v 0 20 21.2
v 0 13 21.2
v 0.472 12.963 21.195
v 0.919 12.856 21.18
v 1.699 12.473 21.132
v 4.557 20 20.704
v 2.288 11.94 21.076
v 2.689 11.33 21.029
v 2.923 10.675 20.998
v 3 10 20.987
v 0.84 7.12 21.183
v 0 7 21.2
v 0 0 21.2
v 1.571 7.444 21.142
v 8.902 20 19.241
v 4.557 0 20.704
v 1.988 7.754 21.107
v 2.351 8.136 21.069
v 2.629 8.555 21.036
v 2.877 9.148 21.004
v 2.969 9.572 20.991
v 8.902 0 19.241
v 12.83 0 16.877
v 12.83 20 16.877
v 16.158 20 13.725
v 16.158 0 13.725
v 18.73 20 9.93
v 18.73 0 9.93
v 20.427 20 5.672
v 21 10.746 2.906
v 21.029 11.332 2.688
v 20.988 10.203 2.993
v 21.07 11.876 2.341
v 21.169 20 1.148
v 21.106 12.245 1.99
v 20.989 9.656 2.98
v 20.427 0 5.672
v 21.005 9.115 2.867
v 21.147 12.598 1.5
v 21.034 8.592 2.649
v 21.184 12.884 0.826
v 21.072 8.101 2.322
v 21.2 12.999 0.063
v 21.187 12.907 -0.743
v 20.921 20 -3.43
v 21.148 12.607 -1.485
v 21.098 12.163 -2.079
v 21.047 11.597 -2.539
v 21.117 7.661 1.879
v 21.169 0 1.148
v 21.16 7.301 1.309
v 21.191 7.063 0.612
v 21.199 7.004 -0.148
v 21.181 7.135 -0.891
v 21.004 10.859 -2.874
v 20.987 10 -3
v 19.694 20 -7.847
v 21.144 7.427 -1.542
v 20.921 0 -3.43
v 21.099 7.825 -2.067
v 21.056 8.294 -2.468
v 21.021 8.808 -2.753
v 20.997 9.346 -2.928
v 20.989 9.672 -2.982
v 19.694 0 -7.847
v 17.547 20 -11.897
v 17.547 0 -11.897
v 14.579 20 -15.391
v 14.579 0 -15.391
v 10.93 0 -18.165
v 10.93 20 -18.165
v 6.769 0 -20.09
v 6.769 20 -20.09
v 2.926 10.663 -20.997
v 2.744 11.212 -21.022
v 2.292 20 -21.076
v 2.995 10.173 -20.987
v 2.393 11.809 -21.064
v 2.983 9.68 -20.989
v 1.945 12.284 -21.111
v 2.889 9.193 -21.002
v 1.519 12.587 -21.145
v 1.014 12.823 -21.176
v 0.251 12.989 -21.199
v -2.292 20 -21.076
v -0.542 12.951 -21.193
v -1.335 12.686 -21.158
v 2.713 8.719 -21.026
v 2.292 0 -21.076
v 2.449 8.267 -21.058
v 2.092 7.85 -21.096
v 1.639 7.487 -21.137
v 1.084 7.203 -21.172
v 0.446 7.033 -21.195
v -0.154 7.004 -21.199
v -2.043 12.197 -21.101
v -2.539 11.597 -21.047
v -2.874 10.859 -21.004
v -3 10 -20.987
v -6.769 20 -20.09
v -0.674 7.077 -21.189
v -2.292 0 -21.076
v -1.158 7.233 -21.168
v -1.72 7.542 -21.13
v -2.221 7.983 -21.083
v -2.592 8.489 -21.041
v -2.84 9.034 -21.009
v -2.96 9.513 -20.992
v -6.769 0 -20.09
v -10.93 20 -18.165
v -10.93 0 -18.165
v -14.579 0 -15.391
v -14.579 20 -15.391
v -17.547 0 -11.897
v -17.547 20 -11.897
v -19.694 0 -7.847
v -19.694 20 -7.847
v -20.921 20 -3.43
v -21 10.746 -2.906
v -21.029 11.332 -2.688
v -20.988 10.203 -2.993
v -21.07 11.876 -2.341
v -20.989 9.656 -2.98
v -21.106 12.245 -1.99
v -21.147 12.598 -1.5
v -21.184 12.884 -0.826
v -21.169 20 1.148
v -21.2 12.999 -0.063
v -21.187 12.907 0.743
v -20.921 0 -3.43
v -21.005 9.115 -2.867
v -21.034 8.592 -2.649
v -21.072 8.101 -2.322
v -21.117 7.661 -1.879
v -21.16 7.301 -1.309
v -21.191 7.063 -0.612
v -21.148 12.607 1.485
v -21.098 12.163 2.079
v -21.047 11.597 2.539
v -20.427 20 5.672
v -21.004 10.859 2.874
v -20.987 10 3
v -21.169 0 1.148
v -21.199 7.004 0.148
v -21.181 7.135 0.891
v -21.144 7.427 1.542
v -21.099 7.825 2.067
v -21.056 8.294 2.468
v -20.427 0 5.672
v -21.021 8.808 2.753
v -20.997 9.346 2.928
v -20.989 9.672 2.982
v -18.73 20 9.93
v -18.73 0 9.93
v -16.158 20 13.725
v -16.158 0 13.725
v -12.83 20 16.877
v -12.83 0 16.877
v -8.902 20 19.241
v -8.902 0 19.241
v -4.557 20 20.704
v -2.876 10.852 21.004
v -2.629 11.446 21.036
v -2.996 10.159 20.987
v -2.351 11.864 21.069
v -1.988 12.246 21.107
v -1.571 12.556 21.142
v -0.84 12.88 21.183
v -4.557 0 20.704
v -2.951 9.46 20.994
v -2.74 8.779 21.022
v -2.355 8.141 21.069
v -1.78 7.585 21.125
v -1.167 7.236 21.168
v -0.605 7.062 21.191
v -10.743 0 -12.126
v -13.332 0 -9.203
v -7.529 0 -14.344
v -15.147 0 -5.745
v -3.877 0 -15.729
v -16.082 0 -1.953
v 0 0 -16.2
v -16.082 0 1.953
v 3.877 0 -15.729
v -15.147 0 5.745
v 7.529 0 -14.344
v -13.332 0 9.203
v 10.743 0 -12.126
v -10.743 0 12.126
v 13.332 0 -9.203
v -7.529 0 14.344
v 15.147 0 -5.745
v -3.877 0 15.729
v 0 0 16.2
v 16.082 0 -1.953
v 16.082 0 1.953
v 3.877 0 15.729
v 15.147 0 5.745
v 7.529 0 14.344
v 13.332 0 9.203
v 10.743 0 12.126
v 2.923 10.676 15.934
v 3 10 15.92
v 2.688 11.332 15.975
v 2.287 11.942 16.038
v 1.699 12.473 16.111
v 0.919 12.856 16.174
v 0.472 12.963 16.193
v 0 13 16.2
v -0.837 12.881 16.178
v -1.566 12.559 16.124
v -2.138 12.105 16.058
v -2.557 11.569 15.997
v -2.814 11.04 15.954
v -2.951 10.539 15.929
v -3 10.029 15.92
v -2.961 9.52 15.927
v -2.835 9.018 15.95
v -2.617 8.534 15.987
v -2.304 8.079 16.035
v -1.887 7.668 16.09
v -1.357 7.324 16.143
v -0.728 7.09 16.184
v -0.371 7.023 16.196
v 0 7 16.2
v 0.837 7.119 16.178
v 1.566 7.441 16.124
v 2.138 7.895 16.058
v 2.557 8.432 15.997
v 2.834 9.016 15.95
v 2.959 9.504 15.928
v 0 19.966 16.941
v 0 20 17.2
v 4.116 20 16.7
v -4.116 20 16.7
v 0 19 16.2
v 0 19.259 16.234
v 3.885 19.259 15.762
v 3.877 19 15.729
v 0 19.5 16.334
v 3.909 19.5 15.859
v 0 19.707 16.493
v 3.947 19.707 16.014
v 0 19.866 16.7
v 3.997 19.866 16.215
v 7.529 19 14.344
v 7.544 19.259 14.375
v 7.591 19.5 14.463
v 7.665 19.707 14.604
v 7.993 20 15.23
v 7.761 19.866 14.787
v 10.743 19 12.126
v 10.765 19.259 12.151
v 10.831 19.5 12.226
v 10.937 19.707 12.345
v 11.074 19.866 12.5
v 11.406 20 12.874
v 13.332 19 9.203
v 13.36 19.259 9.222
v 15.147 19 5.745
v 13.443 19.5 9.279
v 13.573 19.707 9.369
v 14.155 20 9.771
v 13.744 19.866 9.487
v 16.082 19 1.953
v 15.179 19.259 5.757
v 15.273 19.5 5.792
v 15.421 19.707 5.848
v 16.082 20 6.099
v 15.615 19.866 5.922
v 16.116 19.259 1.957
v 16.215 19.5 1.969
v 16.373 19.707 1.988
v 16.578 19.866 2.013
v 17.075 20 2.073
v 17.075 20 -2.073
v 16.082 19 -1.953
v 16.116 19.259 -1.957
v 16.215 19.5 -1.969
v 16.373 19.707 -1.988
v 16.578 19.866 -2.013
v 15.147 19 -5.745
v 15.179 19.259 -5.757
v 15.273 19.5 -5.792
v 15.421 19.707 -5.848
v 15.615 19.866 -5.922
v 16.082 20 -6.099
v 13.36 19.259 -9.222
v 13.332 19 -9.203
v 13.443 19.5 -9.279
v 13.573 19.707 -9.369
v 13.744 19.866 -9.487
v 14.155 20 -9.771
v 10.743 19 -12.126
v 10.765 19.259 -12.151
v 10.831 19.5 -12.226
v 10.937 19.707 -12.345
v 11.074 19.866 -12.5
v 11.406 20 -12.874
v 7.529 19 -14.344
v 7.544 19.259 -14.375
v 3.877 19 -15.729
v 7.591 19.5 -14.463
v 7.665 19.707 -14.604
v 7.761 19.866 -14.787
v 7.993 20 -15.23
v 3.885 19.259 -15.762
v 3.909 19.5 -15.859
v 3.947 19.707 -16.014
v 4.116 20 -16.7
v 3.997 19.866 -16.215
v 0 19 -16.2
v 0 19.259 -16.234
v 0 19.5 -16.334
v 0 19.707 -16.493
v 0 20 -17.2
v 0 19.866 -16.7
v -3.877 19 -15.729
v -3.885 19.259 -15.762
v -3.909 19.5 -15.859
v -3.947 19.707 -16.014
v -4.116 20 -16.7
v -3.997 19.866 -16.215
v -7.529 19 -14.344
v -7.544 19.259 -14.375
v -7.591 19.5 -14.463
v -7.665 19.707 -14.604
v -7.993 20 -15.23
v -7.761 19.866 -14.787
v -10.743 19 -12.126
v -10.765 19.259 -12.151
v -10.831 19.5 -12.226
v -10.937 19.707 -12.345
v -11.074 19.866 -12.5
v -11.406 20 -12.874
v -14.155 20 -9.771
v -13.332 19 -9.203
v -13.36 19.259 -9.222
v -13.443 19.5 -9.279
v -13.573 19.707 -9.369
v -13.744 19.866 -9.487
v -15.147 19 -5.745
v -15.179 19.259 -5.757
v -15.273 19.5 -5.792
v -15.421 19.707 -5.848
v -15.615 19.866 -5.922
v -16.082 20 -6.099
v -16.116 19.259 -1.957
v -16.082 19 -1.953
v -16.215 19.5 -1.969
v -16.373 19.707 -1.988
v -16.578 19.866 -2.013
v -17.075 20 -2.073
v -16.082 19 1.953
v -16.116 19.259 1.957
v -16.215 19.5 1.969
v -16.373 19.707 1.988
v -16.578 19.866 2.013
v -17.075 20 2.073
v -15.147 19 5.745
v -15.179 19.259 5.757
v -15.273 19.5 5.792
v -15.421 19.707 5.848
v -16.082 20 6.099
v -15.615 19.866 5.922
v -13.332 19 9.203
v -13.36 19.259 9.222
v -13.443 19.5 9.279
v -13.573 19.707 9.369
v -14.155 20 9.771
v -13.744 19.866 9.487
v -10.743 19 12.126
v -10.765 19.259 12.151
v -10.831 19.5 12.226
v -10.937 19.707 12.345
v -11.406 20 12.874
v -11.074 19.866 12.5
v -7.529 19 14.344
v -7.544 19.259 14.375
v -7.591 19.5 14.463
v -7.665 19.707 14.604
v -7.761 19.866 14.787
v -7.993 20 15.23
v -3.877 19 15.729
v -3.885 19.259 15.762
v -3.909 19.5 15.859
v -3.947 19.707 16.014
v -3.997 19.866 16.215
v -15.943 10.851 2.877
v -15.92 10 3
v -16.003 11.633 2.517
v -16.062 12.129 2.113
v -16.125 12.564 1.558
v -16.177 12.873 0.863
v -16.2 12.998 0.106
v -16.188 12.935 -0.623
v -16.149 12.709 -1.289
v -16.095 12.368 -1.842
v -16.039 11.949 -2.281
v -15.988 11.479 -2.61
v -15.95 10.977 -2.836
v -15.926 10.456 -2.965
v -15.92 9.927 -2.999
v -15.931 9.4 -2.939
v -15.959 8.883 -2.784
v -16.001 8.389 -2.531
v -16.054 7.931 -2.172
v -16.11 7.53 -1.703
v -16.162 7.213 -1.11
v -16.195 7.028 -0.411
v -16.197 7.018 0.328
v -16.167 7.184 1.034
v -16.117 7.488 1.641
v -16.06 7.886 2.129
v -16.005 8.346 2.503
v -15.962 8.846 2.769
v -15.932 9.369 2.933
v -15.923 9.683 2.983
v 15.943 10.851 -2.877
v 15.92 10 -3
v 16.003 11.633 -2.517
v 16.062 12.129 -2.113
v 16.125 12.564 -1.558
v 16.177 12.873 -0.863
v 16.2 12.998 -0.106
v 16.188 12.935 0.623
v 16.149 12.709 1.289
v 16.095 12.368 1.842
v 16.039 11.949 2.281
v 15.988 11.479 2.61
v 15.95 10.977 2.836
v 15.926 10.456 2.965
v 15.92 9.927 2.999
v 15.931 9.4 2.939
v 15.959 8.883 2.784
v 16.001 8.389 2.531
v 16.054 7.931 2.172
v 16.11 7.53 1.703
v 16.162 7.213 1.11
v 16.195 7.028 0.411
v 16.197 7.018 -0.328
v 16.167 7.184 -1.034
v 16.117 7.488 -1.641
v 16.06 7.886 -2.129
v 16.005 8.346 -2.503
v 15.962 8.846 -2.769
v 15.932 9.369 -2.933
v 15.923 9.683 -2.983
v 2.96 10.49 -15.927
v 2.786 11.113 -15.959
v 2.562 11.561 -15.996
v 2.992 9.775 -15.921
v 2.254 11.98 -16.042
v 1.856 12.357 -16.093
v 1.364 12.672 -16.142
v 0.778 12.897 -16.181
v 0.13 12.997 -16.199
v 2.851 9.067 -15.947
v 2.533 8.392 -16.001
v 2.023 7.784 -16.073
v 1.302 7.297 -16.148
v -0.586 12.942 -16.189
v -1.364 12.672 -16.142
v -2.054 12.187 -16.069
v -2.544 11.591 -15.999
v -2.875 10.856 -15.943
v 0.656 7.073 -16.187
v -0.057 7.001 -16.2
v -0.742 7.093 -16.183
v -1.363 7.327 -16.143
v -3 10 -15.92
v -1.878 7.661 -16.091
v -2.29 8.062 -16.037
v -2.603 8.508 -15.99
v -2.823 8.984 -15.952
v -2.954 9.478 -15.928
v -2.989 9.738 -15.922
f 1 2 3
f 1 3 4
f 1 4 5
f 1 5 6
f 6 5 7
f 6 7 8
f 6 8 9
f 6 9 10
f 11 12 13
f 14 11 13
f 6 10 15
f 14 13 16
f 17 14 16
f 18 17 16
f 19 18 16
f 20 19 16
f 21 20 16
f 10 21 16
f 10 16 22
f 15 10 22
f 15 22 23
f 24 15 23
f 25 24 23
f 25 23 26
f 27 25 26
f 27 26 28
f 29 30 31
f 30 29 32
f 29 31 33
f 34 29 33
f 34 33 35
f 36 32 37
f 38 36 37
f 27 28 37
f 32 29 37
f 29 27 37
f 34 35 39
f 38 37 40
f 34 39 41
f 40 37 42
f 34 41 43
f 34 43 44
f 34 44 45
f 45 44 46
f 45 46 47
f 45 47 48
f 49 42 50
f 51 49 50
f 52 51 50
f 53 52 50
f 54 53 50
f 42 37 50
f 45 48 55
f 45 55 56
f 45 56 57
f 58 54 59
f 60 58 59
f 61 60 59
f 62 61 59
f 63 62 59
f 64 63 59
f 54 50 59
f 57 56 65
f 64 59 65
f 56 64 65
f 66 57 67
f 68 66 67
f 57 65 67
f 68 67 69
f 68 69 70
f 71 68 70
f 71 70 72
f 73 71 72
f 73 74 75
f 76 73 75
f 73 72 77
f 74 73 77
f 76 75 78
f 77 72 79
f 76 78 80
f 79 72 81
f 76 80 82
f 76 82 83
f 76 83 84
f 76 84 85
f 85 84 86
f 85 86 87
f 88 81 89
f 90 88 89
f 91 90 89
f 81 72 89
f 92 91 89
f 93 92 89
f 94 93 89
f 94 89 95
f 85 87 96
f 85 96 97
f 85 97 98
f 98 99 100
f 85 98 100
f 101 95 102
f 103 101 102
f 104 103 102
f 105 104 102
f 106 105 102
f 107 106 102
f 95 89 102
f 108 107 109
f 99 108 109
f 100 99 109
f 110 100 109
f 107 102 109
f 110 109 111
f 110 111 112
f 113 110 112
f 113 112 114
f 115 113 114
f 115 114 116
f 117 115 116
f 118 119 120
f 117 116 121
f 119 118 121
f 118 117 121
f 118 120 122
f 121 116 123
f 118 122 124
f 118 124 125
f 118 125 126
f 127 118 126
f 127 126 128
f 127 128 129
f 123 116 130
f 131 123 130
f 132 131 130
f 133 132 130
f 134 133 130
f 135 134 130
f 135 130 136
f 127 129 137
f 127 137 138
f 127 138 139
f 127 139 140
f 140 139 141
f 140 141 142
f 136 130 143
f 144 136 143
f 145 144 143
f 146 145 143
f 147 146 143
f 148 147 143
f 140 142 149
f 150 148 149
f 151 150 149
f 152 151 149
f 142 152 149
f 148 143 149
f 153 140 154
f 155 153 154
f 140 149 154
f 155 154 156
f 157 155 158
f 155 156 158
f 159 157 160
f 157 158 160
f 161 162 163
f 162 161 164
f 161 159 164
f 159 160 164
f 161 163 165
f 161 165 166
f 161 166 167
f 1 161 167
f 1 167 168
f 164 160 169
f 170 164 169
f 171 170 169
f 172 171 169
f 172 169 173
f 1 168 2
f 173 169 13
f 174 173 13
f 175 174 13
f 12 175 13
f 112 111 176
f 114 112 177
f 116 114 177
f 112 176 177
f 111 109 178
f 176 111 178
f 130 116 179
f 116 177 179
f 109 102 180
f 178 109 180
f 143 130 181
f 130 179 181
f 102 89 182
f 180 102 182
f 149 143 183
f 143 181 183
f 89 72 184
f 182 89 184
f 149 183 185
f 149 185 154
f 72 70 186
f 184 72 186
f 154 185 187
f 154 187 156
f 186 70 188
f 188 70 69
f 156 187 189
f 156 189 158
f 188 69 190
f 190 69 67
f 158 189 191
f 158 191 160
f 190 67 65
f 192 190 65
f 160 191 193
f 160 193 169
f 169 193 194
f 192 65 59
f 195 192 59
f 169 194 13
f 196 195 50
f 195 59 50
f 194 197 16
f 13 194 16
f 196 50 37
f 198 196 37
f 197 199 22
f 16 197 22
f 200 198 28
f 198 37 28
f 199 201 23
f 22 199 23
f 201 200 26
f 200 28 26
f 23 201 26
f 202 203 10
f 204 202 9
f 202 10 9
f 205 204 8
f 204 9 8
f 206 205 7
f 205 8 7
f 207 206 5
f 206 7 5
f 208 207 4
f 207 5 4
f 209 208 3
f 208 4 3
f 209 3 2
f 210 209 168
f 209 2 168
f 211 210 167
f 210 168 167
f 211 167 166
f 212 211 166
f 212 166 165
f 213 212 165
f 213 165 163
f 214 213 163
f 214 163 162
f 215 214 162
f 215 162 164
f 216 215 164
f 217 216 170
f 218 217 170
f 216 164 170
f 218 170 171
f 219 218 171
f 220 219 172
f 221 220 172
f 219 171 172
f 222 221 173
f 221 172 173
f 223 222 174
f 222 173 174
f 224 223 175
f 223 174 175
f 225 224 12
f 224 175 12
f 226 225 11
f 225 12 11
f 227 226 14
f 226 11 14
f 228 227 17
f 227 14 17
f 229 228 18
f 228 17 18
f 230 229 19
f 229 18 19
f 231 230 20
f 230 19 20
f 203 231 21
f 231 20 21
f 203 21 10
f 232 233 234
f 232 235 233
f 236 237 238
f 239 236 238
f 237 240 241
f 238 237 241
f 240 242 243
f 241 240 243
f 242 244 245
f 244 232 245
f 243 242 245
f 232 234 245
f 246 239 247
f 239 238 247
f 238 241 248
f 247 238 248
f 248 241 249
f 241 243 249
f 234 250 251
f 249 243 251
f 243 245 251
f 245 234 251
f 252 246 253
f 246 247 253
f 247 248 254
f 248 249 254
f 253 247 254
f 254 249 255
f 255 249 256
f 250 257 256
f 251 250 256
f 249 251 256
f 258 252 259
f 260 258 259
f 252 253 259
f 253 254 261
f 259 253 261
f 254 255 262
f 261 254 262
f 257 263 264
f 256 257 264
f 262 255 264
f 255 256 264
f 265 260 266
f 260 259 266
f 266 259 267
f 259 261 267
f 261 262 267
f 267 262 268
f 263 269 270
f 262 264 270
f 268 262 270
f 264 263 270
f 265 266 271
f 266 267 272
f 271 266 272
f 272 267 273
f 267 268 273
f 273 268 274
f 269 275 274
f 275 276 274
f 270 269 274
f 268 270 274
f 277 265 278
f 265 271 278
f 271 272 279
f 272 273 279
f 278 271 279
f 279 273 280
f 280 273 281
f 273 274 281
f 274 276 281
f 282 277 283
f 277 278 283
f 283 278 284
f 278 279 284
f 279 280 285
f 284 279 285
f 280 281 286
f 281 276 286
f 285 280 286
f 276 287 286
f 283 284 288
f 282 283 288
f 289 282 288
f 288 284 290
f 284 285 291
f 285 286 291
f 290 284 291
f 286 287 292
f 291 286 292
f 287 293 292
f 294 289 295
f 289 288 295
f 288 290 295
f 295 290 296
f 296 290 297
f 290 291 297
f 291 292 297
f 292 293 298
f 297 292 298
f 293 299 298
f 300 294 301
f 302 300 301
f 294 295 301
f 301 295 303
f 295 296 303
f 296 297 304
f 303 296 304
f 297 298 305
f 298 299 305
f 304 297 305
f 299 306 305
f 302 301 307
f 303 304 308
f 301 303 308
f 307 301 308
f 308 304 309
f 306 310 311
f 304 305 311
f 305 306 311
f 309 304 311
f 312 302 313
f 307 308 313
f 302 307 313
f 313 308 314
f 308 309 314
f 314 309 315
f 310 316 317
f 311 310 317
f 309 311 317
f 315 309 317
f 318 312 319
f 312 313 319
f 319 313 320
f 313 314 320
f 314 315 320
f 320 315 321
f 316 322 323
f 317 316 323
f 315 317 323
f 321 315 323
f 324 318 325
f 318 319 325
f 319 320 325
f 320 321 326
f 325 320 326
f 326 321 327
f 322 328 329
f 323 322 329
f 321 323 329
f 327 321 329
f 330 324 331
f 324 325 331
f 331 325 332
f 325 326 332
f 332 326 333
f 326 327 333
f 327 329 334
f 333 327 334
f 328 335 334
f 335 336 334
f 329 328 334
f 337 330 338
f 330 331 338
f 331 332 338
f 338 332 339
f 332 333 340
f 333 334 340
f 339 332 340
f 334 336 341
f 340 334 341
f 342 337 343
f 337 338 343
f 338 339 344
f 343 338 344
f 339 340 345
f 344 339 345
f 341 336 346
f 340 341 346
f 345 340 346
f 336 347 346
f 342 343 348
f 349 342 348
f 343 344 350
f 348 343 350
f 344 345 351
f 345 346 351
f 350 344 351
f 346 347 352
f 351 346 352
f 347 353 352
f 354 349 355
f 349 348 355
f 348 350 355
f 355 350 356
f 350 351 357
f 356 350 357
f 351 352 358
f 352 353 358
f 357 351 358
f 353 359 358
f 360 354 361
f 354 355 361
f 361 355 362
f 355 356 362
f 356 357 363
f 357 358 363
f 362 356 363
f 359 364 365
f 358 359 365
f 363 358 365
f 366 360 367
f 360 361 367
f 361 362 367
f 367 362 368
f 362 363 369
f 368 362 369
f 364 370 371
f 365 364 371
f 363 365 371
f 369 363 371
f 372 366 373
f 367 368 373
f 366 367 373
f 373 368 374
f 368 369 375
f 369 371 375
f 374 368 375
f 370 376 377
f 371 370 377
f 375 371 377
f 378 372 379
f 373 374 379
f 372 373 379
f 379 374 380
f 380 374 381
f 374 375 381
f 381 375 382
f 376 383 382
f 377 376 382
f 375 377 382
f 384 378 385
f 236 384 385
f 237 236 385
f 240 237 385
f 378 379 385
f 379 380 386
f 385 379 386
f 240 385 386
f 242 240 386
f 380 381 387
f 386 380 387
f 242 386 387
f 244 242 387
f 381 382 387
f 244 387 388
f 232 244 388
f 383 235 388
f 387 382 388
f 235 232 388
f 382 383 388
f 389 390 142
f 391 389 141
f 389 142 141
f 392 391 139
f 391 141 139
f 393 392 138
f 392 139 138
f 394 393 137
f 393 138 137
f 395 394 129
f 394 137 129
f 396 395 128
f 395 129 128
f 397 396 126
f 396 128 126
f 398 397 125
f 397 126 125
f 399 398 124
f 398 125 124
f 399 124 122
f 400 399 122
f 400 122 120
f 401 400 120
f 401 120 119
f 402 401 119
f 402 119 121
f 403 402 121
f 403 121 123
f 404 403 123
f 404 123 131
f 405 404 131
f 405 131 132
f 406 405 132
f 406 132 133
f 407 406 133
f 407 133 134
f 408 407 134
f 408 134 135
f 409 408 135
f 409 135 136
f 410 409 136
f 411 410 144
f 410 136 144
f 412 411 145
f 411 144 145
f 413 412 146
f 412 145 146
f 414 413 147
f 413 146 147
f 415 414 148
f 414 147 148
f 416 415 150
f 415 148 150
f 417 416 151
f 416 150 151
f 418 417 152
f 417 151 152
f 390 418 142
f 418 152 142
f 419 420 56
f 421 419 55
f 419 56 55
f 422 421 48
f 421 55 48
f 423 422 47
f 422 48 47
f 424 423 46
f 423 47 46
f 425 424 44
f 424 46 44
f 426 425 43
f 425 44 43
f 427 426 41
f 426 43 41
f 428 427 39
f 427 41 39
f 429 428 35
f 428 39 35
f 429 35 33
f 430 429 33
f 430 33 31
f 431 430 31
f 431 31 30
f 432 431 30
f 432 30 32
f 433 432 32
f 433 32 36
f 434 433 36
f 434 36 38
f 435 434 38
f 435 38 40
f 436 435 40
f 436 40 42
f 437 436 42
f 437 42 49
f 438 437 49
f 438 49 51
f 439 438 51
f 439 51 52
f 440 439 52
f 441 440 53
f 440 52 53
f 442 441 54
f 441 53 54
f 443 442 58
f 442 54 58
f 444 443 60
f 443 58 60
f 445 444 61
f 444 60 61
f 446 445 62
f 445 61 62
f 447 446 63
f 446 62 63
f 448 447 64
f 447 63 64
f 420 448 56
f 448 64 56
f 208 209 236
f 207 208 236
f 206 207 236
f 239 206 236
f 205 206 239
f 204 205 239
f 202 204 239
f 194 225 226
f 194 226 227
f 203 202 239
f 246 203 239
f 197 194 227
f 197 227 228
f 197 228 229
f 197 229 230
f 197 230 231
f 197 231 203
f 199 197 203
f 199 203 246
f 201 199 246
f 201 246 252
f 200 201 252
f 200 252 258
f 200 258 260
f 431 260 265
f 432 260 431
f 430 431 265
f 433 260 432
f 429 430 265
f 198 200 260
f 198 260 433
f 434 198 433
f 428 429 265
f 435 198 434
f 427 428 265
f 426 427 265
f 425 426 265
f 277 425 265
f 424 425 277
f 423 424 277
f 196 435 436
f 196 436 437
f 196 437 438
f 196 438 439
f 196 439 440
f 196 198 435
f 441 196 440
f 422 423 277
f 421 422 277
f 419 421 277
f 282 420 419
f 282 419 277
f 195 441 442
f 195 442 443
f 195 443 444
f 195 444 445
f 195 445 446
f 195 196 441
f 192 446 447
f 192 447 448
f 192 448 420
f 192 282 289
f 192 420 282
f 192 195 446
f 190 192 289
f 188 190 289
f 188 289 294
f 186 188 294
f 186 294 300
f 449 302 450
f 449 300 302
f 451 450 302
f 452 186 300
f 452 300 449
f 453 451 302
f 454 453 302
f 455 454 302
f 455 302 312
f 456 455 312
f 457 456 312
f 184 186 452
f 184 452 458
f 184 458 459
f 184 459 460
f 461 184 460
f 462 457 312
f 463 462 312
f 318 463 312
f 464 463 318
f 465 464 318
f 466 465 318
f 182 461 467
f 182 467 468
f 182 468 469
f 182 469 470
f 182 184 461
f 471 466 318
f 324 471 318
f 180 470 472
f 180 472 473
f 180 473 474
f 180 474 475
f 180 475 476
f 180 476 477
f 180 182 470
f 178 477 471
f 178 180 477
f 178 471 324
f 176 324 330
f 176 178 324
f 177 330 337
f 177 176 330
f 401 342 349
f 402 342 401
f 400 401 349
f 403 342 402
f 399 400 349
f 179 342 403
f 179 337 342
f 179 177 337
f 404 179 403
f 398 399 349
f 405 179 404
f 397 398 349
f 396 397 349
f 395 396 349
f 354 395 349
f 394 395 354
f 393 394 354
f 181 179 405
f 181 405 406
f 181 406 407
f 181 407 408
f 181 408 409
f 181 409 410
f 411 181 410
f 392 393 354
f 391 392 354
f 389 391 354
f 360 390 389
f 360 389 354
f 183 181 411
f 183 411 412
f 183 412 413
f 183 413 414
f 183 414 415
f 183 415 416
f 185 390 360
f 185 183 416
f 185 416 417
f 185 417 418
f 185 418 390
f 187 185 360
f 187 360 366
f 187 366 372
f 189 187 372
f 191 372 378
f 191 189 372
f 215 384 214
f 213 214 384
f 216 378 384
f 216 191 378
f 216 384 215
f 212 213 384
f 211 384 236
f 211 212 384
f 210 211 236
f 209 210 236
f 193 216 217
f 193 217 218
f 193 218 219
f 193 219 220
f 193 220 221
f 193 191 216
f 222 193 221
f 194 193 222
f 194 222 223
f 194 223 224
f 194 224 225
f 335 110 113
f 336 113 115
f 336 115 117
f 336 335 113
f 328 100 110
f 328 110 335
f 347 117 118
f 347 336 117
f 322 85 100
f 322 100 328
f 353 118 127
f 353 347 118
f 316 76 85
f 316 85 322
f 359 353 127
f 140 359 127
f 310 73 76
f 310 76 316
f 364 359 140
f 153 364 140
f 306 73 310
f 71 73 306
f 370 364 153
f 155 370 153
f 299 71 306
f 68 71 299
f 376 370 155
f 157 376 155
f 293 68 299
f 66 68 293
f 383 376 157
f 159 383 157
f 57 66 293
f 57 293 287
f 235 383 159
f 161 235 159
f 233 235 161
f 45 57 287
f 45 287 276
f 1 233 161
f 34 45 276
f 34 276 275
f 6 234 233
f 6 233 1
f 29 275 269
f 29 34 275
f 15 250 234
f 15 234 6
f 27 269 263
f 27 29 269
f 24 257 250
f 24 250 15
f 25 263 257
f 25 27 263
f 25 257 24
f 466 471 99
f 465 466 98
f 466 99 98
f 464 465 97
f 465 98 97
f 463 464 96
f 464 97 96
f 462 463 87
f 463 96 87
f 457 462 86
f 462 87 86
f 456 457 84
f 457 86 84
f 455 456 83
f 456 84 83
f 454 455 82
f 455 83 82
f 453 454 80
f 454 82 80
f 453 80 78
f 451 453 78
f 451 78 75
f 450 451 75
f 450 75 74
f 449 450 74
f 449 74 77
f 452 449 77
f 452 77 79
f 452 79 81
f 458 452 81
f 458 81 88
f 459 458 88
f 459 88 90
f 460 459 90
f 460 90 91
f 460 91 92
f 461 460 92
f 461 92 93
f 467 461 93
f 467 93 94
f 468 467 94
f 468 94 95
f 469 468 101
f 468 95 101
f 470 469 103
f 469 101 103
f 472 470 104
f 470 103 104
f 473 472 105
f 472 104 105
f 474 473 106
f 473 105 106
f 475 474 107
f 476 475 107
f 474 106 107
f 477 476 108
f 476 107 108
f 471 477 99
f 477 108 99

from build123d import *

# Parameters (mm, degrees)
SKETCH1_R           = 21.2
SKETCH1_R_2         = 16.2
BOSS_EXTRUDE1_DEPTH = 20
FILLET1_R           = 1
SKETCH2_R           = 3
CUT_EXTRUDE1_DEPTH  = 10
CIRPATTERN1_COUNT   = 4


with BuildPart() as part:
    # Sketch1 → Boss-Extrude1 (new body)
    with BuildSketch(Plane(origin=(0, 0, 0), x_dir=(1, 0, 0), z_dir=(0, 1, 0))):
        with Locations(Location((0, 0, 0), (0, 0, 270))):
            Circle(SKETCH1_R)
        with Locations(Location((0, 0, 0), (0, 0, 270))):
            Circle(SKETCH1_R_2, mode=Mode.SUBTRACT)
    extrude(amount=BOSS_EXTRUDE1_DEPTH)

    # Fillet1
    fillet1_edges = [part.edges().sort_by_distance(p)[0] for p in [
        (0, 20, -16.2),
    ]]
    fillet(fillet1_edges, radius=FILLET1_R)

    # Sketch2 → Cut-Extrude1 (cut)
    with BuildSketch(Plane(origin=(21.2, 0, 0), x_dir=(0, 0, -1), z_dir=(1, 0, 0))):
        with Locations((0, 10)):
            Circle(SKETCH2_R)
    cut_extrude1 = extrude(amount=-CUT_EXTRUDE1_DEPTH, mode=Mode.SUBTRACT)

    # CirPattern1: Cut-Extrude1 ×4 about axis
    cirpattern1_axis = Axis((0, 19, 0), (0, -1, 0))
    for i in range(1, CIRPATTERN1_COUNT):
        add(cut_extrude1.rotate(cirpattern1_axis, i * 360 / CIRPATTERN1_COUNT), mode=Mode.SUBTRACT)


solid = part.part
